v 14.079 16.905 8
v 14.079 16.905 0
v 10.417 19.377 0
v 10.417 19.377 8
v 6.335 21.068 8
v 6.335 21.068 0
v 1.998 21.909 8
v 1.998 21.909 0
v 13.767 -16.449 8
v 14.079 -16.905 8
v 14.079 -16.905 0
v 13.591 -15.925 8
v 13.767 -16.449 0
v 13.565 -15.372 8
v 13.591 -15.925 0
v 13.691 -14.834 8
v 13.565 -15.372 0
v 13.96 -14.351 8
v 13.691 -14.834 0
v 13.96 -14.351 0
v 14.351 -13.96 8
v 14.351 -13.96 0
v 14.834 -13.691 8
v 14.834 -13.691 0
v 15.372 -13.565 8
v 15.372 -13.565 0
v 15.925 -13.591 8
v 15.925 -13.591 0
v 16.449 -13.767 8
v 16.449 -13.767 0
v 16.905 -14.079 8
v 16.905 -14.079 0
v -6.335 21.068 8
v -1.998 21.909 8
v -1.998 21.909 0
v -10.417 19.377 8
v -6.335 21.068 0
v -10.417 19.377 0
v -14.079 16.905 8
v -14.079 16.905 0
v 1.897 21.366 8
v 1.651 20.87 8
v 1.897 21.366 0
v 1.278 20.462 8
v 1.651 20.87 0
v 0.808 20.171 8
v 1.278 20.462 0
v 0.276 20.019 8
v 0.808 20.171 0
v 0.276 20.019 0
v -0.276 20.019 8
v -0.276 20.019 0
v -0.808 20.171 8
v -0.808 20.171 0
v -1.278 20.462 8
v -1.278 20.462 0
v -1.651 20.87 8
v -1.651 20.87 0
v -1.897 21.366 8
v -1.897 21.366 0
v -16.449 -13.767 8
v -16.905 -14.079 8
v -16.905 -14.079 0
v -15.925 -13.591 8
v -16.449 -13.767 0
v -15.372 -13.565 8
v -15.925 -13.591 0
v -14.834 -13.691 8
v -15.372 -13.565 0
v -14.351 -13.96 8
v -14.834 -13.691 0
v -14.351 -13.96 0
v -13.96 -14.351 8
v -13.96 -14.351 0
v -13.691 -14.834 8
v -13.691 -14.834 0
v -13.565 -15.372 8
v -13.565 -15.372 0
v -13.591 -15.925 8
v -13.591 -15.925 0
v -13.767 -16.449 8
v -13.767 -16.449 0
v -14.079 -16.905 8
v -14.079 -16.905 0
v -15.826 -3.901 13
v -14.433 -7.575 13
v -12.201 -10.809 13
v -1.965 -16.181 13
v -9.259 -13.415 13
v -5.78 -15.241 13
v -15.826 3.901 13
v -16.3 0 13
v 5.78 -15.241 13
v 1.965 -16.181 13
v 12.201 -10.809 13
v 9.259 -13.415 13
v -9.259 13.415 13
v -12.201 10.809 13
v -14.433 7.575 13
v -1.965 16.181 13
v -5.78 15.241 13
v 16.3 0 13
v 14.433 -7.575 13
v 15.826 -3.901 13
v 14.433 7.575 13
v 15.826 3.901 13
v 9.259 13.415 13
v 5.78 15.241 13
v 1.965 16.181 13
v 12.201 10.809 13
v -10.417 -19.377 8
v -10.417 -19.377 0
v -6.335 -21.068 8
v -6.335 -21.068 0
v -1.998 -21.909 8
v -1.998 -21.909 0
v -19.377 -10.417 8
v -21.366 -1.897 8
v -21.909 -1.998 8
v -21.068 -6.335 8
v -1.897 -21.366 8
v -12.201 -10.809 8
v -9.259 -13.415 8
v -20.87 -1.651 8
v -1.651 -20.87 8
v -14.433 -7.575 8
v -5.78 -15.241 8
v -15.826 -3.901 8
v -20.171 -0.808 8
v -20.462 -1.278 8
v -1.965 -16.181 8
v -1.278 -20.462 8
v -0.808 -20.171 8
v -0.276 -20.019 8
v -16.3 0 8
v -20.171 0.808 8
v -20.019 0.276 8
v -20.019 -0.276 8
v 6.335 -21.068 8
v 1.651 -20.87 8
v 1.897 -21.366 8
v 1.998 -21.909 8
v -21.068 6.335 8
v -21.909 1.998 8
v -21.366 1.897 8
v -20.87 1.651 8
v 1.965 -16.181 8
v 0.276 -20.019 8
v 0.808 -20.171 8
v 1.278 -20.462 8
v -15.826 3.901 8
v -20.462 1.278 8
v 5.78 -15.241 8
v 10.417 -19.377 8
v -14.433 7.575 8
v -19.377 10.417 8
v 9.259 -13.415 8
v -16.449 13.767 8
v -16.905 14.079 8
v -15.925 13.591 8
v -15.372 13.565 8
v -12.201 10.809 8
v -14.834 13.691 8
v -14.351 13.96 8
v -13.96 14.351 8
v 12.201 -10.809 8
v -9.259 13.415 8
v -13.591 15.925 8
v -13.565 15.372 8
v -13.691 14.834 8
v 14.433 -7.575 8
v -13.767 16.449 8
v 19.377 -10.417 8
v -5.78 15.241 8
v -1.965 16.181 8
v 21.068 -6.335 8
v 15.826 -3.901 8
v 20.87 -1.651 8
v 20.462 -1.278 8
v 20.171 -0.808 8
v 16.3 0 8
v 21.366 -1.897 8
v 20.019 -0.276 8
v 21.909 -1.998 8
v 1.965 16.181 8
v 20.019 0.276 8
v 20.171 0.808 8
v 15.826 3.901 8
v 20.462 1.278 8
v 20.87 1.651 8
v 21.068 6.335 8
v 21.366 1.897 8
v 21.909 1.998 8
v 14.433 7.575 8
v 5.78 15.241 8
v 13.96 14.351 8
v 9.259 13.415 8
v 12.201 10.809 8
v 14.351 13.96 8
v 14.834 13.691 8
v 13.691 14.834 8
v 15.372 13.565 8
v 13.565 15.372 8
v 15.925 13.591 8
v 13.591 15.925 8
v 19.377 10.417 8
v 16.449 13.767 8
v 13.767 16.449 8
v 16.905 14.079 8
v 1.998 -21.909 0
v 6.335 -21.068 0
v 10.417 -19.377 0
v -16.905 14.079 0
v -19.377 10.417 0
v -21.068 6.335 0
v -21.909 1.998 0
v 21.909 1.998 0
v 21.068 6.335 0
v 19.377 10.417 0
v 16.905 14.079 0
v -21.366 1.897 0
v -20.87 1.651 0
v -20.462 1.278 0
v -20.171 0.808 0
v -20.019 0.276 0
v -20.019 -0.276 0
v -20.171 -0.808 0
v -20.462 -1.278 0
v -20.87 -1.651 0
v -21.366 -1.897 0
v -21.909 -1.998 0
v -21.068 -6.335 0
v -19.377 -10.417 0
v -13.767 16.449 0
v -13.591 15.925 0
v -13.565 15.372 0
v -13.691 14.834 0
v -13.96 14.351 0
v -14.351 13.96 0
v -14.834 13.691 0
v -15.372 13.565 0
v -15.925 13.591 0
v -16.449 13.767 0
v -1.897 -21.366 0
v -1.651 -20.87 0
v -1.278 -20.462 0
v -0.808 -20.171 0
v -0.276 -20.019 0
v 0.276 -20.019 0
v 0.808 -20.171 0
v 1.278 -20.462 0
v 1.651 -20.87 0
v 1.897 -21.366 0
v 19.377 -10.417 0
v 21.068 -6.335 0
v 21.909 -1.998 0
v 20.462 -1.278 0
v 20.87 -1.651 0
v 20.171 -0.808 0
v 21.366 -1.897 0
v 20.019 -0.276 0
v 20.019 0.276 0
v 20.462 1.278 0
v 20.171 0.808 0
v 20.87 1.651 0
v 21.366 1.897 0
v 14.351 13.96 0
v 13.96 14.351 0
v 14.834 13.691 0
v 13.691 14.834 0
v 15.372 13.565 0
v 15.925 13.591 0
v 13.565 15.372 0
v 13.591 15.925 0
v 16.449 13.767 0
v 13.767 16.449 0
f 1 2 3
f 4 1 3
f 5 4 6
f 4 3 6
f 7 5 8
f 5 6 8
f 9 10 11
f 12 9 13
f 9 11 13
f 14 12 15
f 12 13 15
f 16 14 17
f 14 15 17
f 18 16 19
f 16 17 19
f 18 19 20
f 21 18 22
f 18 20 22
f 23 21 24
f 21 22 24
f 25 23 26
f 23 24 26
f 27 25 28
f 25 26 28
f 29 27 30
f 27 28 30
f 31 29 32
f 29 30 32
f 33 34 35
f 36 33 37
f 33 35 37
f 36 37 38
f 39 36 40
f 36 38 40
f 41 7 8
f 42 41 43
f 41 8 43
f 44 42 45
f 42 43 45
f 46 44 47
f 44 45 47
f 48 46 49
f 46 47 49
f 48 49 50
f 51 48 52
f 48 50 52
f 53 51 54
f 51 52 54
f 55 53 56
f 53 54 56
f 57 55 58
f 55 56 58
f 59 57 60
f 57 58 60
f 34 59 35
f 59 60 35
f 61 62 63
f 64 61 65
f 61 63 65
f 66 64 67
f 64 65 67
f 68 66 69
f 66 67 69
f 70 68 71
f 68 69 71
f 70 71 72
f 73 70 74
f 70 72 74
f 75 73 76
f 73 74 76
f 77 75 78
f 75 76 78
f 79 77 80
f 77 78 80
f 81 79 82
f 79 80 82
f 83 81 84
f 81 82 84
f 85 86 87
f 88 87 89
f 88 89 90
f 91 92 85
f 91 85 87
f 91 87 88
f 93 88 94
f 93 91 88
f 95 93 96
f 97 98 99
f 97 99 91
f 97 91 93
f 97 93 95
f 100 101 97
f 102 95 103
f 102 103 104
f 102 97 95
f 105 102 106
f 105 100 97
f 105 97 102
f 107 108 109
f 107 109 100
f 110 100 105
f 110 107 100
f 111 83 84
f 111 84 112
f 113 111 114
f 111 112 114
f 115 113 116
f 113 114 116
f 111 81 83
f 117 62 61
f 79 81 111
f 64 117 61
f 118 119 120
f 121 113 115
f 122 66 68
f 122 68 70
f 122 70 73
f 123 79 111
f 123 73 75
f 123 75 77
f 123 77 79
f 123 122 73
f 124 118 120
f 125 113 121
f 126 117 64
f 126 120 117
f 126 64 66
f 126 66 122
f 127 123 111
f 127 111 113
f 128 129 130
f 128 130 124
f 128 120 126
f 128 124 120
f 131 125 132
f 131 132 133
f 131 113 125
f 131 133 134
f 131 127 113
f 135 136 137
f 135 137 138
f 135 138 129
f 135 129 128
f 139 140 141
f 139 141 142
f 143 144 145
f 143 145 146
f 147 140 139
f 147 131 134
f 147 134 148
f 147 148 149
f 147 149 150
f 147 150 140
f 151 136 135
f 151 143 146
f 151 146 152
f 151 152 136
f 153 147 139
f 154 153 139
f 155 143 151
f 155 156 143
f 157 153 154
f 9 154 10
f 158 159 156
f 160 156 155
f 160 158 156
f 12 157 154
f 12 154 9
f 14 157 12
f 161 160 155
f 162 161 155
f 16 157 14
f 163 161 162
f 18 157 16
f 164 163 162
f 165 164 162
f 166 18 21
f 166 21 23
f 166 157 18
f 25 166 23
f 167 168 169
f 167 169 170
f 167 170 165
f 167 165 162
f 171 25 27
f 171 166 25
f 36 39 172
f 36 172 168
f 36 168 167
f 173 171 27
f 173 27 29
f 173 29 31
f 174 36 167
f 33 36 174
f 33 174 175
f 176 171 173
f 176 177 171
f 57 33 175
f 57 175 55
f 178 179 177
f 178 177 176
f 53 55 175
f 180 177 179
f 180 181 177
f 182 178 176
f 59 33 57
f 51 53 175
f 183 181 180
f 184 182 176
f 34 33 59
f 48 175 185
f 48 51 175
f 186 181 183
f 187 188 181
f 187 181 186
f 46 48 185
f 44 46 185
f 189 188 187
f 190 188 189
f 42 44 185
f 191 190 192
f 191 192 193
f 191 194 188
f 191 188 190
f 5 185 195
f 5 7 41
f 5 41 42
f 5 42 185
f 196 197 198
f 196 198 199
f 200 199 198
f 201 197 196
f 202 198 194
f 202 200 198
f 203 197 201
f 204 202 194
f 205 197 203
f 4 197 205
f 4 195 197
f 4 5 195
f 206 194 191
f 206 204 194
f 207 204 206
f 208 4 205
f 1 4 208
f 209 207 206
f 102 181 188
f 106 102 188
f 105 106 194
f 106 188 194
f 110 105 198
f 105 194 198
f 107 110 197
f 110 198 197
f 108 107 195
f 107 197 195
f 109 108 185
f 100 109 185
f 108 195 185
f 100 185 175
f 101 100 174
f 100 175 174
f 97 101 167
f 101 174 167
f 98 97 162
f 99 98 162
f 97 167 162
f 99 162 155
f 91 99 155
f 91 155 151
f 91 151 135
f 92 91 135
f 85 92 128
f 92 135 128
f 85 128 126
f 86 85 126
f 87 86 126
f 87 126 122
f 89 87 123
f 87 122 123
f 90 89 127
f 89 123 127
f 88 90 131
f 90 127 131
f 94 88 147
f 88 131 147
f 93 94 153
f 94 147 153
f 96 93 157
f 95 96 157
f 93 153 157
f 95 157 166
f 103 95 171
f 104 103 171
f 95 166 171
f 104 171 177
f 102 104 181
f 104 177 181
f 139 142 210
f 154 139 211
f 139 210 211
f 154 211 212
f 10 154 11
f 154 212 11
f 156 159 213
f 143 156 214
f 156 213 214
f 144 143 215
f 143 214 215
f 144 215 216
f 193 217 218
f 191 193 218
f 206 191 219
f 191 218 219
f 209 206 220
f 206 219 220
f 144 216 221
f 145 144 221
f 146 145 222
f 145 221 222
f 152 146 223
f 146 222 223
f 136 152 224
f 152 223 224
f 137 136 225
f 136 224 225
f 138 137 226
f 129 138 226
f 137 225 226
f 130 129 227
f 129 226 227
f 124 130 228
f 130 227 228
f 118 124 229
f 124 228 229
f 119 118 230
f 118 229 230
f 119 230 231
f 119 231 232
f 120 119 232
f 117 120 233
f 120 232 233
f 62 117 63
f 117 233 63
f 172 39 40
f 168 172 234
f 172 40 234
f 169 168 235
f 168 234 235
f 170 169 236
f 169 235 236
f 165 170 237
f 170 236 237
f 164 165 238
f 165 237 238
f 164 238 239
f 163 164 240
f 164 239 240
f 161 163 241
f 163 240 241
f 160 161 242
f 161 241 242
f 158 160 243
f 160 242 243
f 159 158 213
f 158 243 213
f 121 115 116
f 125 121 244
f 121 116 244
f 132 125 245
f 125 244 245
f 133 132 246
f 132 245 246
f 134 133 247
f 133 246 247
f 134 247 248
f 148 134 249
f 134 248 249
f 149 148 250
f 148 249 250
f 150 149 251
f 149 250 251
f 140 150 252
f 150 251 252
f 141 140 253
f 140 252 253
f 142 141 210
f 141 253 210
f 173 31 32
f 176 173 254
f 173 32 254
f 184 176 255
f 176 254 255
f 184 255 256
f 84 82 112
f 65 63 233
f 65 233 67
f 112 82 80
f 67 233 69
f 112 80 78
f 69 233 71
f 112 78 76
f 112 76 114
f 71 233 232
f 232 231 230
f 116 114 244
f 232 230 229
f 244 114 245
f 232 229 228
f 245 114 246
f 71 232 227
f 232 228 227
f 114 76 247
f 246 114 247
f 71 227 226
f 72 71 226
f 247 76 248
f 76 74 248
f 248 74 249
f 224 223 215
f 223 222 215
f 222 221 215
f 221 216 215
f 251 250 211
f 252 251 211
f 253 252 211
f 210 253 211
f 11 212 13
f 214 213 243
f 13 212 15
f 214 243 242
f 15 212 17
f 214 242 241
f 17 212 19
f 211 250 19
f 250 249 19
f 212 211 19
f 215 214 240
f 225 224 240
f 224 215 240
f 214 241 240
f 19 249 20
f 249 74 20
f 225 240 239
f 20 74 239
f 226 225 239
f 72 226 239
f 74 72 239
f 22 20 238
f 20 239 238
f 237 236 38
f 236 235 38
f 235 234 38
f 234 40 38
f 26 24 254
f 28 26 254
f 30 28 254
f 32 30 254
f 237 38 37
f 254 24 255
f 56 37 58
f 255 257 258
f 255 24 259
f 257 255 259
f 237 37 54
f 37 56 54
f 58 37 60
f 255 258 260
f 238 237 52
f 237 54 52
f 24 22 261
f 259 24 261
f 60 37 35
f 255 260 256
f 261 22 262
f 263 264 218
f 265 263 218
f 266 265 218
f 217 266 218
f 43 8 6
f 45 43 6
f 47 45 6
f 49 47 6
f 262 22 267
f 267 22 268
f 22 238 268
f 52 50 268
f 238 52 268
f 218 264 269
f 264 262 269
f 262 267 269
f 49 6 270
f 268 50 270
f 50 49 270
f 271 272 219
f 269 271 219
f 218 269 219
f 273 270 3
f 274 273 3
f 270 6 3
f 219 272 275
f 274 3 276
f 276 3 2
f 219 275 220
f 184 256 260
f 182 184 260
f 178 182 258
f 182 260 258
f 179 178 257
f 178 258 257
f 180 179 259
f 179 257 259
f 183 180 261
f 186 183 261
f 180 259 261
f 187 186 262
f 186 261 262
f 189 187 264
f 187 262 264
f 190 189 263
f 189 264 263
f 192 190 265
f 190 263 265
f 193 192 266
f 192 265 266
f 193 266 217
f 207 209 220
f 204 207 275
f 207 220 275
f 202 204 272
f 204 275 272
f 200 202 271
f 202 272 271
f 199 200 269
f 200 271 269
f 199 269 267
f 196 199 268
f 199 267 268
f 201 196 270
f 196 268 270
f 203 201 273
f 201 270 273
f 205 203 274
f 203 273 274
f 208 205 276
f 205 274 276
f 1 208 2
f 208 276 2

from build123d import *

# Parameters (mm, degrees)
F0_R     = 22
F1_DEPTH = 8
F2_R     = 16.3
F3_DEPTH = 5
F4_R     = 2
F5_DEPTH = 25


with BuildPart() as f1:
    # F0 (on Top) → F1 (new body)
    with BuildSketch(Plane.XY):
        Circle(F0_R)
    extrude(amount=F1_DEPTH)

    # F2 (on face) → F3 (join)
    with BuildSketch(Plane.XY.offset(8)):
        Circle(F2_R)
    extrude(amount=F3_DEPTH)

    # F4 (on face) → F5 (cut)
    with BuildSketch(Plane(origin=(0, 0, 0), x_dir=(1, 0, 0), z_dir=(0, 0, -1))):
        with Locations((22, 0)):
            Circle(F4_R)
        with Locations((15.556349, -15.556349)):
            Circle(F4_R)
        with Locations((0, -22)):
            Circle(F4_R)
        with Locations((-15.556349, -15.556349)):
            Circle(F4_R)
        with Locations((-22, 0)):
            Circle(F4_R)
        with Locations((-15.556349, 15.556349)):
            Circle(F4_R)
        with Locations((0, 22)):
            Circle(F4_R)
        with Locations((15.556349, 15.556349)):
            Circle(F4_R)
    extrude(amount=-F5_DEPTH, mode=Mode.SUBTRACT)


solid = f1.part
